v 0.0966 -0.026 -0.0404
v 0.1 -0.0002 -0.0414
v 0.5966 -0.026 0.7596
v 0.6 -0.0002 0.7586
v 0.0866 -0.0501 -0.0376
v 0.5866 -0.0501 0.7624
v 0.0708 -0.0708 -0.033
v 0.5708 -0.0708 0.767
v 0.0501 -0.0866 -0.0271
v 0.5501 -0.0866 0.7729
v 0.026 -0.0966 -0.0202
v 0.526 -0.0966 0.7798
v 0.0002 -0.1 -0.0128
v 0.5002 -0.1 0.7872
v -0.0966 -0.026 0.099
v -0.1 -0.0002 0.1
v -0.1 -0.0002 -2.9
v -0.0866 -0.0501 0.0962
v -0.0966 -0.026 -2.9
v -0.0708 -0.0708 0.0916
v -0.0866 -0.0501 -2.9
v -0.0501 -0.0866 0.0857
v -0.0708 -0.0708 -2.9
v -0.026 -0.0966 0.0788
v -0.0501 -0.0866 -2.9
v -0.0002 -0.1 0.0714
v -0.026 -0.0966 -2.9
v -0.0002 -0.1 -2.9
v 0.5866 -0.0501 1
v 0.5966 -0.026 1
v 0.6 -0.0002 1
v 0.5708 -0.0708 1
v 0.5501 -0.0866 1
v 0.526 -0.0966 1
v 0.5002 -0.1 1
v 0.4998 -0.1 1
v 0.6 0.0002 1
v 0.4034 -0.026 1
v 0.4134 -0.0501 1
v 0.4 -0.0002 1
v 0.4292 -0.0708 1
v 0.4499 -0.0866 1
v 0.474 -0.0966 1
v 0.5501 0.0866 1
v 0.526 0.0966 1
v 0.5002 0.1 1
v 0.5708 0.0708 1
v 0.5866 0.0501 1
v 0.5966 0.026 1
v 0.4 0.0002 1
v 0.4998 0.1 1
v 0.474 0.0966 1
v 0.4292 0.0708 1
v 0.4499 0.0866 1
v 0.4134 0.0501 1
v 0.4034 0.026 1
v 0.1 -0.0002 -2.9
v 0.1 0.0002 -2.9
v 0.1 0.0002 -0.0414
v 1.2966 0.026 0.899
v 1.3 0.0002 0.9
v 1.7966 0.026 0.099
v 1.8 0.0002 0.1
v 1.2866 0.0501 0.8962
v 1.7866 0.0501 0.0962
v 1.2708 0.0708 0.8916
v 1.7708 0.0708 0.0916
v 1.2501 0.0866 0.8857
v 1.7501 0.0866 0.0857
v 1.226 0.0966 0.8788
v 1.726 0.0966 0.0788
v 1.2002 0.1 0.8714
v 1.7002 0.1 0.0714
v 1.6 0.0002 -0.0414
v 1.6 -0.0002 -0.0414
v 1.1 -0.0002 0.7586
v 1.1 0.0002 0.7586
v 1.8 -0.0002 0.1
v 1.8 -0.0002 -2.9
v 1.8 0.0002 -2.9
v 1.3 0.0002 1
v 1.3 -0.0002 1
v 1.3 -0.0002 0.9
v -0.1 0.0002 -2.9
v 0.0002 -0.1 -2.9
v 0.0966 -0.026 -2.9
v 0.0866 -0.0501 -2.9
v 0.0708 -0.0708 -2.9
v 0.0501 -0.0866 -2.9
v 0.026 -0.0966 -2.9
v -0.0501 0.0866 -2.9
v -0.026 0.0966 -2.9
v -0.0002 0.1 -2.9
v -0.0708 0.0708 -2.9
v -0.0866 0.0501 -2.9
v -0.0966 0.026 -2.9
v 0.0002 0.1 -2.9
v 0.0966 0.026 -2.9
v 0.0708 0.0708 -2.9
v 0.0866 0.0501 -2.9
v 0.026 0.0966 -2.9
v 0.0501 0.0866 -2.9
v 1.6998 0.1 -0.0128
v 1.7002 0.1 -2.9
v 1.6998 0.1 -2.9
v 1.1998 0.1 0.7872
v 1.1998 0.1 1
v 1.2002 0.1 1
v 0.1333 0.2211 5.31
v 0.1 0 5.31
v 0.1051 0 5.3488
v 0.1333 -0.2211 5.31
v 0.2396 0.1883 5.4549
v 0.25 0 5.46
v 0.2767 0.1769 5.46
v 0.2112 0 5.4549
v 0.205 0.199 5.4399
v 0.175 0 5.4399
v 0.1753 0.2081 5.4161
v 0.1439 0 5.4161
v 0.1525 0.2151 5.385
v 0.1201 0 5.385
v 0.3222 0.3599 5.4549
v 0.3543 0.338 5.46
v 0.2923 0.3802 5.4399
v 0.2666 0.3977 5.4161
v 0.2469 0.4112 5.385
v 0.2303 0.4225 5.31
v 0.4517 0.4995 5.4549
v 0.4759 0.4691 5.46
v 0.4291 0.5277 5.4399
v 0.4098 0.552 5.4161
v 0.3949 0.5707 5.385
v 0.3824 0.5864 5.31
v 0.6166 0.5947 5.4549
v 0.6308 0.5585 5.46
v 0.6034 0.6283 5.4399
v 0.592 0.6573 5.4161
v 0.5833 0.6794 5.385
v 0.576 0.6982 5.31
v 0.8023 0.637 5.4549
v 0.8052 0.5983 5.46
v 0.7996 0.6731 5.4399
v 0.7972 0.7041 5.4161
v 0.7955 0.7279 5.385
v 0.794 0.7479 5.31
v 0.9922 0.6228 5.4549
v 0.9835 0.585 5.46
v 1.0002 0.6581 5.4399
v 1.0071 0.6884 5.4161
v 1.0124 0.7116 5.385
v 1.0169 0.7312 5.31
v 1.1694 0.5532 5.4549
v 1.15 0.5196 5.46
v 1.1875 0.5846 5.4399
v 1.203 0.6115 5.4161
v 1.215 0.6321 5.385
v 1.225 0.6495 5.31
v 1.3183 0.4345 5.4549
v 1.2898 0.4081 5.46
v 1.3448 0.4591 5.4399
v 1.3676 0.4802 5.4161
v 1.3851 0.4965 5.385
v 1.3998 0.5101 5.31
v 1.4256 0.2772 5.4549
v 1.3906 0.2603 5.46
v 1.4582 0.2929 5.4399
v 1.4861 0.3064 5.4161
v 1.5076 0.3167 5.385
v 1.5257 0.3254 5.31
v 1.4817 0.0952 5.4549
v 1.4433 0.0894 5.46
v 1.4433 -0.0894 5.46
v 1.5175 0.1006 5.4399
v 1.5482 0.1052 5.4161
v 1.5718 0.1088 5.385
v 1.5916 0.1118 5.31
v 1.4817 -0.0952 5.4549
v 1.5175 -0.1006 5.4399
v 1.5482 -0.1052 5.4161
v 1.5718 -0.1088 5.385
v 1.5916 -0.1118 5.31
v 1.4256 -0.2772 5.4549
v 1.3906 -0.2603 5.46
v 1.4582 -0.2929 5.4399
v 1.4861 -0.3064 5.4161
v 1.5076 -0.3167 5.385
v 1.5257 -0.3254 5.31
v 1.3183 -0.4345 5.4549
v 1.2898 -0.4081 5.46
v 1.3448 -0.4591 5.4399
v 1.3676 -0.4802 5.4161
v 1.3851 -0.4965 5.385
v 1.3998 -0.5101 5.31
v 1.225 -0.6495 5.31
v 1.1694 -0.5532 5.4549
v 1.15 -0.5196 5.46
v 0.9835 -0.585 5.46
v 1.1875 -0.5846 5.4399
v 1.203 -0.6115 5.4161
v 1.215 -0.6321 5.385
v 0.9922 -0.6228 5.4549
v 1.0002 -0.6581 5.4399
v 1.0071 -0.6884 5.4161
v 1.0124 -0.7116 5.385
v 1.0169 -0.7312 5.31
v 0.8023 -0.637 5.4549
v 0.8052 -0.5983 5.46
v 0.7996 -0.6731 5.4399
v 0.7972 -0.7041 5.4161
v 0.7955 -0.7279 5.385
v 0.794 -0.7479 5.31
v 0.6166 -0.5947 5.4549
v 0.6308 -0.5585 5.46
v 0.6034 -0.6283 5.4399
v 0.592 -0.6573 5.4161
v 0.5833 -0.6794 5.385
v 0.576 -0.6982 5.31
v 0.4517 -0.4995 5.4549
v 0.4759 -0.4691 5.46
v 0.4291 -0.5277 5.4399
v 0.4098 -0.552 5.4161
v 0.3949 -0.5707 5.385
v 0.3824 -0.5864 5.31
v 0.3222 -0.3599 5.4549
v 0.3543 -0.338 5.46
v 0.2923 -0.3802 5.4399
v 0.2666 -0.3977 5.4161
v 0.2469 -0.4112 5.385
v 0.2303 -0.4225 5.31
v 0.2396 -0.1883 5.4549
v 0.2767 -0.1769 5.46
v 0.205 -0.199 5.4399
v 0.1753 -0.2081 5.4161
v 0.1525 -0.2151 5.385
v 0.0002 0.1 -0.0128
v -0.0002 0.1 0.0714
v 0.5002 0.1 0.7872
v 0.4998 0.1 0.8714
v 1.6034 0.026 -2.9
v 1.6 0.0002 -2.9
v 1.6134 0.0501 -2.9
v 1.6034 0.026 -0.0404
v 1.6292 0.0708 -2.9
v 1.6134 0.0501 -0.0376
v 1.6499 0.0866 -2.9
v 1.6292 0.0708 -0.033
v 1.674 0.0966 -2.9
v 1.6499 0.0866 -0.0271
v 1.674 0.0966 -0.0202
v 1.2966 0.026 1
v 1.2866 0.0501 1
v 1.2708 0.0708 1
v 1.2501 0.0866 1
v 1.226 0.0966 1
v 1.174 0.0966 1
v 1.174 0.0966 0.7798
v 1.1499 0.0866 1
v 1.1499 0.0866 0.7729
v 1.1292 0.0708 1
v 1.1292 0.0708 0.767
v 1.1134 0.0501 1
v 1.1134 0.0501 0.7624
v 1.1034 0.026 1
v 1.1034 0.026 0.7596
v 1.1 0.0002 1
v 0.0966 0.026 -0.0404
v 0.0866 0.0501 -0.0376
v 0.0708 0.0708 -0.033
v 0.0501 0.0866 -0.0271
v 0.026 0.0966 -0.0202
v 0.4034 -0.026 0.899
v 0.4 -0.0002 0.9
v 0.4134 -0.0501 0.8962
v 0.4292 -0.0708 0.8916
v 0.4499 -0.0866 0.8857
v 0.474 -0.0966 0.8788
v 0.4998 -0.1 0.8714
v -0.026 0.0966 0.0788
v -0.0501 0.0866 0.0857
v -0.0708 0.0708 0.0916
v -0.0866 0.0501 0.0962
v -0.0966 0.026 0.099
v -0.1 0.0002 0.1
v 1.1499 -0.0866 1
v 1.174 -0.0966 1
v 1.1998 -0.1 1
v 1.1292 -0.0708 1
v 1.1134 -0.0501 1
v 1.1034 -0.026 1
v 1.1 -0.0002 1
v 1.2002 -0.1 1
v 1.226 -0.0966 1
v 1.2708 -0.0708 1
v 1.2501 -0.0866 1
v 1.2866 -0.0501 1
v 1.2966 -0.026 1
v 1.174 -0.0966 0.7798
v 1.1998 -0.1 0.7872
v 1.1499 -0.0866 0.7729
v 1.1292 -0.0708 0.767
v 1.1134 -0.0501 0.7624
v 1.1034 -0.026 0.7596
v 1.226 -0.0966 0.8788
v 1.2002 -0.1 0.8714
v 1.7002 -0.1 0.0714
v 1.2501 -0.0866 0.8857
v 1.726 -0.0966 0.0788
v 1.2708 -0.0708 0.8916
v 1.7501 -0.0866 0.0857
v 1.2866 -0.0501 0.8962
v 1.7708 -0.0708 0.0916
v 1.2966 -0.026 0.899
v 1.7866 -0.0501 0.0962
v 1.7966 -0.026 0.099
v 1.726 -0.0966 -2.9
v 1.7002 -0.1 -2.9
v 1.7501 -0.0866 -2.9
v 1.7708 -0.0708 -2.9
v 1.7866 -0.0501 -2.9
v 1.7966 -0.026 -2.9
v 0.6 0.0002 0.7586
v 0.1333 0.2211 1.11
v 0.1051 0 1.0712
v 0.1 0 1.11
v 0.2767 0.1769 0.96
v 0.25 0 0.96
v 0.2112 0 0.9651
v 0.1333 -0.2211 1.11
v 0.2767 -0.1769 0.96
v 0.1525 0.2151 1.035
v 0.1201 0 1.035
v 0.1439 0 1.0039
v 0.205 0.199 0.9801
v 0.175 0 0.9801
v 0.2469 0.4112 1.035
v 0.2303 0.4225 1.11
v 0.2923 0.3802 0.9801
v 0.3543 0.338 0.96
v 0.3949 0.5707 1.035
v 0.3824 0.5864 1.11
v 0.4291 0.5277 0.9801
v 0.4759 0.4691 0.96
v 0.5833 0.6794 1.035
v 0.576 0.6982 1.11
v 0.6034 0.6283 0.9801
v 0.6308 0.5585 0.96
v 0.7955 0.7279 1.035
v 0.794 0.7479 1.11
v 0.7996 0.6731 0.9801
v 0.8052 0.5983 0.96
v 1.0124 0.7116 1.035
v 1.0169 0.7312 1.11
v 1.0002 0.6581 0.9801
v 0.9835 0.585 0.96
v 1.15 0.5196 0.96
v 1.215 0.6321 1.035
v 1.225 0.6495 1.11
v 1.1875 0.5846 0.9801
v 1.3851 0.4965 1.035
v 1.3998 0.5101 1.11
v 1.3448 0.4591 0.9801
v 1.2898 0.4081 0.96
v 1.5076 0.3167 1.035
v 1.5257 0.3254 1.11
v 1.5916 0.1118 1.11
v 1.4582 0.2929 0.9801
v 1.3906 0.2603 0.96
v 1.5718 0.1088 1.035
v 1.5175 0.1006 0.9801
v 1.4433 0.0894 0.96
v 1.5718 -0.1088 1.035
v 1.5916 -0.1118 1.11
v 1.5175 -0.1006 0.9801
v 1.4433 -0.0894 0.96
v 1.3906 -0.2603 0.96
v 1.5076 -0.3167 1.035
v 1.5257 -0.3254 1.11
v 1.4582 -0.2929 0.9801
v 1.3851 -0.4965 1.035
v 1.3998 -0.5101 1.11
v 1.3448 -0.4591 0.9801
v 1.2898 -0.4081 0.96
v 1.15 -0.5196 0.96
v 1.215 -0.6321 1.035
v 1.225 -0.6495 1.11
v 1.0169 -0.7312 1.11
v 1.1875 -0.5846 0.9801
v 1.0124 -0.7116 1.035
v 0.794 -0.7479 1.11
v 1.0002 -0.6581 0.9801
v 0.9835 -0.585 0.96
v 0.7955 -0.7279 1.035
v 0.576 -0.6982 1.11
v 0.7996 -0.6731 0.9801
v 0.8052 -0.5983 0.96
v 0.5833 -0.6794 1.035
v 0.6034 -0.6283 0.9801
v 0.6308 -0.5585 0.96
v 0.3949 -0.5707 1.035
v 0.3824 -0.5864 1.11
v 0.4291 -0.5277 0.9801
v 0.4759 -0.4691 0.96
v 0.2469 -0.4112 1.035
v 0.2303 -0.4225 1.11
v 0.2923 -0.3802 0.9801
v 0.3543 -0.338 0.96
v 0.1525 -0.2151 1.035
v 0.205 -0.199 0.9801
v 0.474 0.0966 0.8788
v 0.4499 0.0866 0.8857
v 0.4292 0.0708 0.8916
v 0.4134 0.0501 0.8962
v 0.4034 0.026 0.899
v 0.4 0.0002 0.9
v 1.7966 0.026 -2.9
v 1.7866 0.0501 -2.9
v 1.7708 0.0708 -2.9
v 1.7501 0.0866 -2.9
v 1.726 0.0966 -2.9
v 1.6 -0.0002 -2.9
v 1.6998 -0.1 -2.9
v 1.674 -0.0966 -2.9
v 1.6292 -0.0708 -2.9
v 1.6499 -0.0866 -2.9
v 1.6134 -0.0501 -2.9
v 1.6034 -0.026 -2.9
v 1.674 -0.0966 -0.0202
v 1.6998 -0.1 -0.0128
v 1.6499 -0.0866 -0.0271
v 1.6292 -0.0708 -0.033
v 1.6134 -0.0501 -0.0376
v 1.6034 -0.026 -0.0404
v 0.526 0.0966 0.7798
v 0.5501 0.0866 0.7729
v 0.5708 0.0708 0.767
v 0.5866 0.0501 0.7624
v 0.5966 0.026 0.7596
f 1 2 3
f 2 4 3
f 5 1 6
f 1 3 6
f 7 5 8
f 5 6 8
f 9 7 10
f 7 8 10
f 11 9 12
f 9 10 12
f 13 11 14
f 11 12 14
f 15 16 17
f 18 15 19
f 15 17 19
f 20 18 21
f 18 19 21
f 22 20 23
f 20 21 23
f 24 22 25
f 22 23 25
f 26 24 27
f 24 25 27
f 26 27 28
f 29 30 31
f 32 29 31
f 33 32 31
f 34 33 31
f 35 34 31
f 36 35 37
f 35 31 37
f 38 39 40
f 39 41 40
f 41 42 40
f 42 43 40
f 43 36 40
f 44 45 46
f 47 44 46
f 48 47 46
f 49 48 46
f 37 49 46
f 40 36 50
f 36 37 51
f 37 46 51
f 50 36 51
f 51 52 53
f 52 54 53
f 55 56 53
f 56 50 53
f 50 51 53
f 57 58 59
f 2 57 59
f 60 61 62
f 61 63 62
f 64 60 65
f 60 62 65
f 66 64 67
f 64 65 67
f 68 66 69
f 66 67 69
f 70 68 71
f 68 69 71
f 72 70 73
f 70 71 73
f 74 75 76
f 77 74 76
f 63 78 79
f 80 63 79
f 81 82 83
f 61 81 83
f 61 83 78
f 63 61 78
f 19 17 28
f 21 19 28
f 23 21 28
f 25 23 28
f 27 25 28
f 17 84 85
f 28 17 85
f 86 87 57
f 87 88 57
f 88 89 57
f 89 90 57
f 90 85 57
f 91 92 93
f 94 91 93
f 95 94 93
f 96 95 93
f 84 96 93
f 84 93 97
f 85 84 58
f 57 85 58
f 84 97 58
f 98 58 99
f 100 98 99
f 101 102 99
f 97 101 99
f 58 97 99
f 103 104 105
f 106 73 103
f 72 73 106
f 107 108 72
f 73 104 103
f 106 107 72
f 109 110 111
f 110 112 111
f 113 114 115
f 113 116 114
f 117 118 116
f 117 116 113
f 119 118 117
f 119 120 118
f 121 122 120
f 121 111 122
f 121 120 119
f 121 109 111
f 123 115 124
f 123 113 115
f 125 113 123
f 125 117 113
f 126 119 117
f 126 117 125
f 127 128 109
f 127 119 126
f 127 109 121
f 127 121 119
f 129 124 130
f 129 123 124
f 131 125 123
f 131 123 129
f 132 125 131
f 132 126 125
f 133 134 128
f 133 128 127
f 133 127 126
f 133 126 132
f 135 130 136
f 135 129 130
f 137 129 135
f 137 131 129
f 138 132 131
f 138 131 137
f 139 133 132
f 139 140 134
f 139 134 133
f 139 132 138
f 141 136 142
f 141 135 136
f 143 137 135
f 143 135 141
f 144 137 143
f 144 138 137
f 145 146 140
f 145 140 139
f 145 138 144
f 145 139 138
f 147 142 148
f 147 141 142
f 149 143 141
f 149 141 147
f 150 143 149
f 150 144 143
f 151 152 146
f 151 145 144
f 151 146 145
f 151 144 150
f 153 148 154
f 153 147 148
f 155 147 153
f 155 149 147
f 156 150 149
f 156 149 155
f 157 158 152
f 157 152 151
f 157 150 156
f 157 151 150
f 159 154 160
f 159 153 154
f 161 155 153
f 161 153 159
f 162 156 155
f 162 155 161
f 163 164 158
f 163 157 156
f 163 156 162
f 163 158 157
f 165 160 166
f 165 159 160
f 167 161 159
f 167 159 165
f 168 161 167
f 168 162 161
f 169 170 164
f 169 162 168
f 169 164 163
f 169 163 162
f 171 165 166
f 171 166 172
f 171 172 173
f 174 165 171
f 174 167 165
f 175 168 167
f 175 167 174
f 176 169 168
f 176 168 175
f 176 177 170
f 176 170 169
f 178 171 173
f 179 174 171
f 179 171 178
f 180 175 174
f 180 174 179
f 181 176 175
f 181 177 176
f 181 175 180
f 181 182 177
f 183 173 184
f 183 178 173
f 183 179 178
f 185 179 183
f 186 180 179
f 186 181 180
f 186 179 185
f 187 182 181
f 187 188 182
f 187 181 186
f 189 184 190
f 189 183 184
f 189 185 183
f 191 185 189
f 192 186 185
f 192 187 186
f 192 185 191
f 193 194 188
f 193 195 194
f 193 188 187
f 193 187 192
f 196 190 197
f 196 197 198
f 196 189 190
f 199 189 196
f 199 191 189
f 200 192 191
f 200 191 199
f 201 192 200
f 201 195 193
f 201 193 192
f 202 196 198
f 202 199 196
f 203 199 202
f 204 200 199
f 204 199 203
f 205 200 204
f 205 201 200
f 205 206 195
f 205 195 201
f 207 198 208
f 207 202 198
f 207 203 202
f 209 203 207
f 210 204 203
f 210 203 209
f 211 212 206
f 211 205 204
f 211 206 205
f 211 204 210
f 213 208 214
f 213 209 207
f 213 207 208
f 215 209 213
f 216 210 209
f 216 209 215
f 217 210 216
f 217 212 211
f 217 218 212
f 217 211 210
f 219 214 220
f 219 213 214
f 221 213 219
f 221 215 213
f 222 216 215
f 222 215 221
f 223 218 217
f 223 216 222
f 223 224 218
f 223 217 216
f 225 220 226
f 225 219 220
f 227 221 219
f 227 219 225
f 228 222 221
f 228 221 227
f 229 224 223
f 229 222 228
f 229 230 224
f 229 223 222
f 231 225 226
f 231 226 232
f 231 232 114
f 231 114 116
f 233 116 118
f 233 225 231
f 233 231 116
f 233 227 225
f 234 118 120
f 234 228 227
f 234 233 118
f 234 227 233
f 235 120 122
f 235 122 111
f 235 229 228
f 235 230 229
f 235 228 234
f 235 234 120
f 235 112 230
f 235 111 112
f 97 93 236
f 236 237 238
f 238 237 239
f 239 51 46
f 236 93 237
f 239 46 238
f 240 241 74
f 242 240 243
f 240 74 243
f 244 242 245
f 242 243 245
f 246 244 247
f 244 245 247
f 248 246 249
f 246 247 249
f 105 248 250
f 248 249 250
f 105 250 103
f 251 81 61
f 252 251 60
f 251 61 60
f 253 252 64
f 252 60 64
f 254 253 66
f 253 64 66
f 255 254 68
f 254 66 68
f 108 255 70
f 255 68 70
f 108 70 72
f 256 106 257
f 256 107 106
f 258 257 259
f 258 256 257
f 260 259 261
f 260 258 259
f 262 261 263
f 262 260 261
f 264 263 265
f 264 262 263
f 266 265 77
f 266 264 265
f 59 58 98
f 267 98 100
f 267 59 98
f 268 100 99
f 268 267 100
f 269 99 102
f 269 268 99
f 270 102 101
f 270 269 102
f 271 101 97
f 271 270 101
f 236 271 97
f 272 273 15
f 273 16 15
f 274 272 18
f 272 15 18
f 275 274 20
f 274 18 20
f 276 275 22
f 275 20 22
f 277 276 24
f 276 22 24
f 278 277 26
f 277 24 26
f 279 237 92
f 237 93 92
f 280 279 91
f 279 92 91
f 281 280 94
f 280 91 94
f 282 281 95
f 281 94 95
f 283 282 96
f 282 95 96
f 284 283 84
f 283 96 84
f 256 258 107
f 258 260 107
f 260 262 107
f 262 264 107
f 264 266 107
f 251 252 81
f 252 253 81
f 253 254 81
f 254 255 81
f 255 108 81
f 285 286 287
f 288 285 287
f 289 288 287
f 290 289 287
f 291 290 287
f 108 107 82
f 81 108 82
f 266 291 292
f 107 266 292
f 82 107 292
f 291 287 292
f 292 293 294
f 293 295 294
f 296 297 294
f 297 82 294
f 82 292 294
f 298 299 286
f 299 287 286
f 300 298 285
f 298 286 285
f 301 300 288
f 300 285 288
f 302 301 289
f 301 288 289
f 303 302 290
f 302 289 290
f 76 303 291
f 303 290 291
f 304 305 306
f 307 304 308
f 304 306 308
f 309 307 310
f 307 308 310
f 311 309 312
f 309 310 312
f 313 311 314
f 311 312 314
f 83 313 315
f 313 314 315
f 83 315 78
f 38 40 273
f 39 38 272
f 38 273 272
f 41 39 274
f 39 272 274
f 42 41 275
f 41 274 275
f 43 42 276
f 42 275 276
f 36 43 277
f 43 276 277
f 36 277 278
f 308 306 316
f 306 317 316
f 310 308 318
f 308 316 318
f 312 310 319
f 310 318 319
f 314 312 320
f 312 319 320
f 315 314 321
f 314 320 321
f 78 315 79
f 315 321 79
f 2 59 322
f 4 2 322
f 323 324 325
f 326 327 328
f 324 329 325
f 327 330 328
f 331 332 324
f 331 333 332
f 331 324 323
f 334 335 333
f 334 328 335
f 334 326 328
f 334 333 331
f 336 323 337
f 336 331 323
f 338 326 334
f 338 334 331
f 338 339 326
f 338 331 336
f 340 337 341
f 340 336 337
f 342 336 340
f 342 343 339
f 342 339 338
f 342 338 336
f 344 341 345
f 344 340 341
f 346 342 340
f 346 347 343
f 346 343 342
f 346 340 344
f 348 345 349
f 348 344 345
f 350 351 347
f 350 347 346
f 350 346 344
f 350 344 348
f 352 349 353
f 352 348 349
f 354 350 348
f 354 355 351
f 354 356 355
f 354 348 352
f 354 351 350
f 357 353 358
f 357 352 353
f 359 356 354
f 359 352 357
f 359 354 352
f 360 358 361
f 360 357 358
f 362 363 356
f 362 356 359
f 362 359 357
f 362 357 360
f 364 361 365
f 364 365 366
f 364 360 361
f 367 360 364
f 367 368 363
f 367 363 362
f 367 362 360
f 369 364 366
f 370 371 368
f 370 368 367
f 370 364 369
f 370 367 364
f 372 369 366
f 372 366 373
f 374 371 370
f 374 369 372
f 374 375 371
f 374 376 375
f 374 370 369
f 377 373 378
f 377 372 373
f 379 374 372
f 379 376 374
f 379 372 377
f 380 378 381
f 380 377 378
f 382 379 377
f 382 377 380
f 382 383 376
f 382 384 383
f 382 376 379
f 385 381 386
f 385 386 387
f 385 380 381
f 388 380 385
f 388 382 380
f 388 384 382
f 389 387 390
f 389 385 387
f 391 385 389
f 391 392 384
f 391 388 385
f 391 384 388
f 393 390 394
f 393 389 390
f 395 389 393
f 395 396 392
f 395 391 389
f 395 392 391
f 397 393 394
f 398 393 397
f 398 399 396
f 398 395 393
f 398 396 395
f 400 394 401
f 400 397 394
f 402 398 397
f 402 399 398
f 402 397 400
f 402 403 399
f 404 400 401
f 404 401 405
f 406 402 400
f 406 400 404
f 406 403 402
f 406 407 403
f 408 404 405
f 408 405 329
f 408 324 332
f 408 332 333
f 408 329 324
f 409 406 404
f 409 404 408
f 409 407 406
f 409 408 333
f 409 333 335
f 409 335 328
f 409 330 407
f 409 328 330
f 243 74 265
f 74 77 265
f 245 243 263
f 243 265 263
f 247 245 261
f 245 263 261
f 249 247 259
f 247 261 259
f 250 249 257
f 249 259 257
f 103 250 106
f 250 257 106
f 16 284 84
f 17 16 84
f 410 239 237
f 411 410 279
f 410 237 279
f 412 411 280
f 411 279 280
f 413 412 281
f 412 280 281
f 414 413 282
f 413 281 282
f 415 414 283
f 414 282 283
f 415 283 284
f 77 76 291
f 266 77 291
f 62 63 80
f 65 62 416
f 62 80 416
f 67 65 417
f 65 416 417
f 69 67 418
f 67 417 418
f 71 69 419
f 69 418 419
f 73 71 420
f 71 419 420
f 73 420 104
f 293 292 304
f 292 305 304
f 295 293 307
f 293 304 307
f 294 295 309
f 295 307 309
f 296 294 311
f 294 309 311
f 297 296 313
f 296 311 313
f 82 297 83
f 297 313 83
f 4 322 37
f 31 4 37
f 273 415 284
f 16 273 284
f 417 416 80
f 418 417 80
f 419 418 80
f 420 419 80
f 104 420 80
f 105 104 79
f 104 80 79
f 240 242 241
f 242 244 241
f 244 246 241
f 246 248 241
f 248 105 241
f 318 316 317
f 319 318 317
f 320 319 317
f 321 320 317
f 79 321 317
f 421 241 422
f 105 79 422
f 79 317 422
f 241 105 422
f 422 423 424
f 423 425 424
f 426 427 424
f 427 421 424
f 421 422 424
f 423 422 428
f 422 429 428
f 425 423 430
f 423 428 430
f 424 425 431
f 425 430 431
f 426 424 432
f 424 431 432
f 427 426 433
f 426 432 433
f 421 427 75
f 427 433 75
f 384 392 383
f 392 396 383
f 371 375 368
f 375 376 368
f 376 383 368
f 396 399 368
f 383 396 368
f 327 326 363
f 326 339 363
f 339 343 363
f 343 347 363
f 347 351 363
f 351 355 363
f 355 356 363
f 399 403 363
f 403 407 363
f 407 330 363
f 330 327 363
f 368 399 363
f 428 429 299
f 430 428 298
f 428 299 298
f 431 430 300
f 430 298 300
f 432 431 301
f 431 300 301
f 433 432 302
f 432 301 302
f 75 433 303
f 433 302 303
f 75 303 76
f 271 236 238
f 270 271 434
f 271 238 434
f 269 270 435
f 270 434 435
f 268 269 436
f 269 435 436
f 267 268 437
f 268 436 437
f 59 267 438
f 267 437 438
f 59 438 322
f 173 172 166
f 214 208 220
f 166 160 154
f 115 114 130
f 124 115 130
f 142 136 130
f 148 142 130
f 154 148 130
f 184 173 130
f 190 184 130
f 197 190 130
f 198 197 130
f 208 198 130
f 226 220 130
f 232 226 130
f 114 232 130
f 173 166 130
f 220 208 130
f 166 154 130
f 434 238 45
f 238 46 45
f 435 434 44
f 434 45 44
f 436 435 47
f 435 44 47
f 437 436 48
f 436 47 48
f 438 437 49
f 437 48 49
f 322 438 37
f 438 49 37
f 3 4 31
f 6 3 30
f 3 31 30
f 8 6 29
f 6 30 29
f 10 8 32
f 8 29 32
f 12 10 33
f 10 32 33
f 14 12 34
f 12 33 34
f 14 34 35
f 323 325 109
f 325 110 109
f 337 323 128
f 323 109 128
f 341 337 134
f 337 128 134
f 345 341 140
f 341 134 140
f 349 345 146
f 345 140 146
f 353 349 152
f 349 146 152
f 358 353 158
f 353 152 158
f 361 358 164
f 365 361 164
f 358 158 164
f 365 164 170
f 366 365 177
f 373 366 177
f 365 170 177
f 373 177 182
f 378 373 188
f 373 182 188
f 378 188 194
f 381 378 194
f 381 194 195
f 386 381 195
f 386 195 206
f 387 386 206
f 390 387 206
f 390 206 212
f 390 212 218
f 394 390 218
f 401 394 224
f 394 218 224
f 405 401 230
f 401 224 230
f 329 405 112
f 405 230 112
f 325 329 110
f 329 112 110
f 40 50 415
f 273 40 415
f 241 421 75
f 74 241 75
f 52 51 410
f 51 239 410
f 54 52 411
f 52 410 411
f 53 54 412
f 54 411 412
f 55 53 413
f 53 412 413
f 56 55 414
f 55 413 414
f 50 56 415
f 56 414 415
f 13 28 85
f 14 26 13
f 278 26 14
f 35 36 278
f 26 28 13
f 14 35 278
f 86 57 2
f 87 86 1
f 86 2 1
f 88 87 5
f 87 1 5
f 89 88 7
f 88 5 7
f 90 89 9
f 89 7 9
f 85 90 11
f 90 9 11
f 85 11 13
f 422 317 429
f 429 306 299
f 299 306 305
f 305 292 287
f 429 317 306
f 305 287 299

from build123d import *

# Parameters (mm, degrees)
PAD_DEPTH = 0.1
FILLET_R  = 0.0998


with BuildPart() as revolution:
    # Sketch002 → Revolution (revolve)
    with BuildSketch(Plane.XZ):
        with BuildLine():
            Line((0.25, 5.46), (0.85, 5.46))
            Line((0.85, 0.96), (0.85, 5.46))
            Line((0.85, 0.96), (0.25, 0.96))
            ThreePointArc((0.1, 1.11), (0.143934, 1.003934), (0.25, 0.96))
            Line((0.1, 1.11), (0.1, 5.31))
            ThreePointArc((0.25, 5.46), (0.143934, 5.416066), (0.1, 5.31))
        make_face()
    revolve(axis=Axis((0.85, 0, 5.46), (0, 0, -1)))


with BuildPart() as fillet_body:
    # Sketch → Pad (new body, symmetric)
    with BuildSketch(Plane.XZ):
        Polygon((0.1, -2.9), (0.1, -0.041421), (0.6, 0.758579), (0.6, 1), (0.4, 1), (0.4, 0.9), (-0.1, 0.1), (-0.1, -2.9), align=None)
        Polygon((1.1, 1), (1.3, 1), (1.3, 0.9), (1.8, 0.1), (1.8, -2.9), (1.6, -2.9), (1.6, -0.041421), (1.1, 0.758579), align=None)
    extrude(amount=PAD_DEPTH, both=True)

    # Fillet
    fillet_edges = [fillet_body.edges().sort_by_distance(p)[0] for p in [
        (0.15, -0.1, 0.5),
        (0.4, -0.1, 0.95),
        (0.6, -0.1, 0.879289),
        (0.35, -0.1, 0.358579),
        (0.1, -0.1, -1.470711),
        (-0.1, -0.1, -1.4),
        (0.1, 0.1, -1.470711),
        (0.35, 0.1, 0.358579),
        (0.6, 0.1, 0.879289),
        (1.35, -0.1, 0.358579),
        (1.1, -0.1, 0.879289),
        (1.6, -0.1, -1.470711),
        (1.8, -0.1, -1.4),
        (1.55, -0.1, 0.5),
        (1.3, -0.1, 0.95),
        (1.3, 0.1, 0.95),
        (1.55, 0.1, 0.5),
        (1.8, 0.1, -1.4),
        (1.6, 0.1, -1.470711),
        (1.35, 0.1, 0.358579),
        (1.1, 0.1, 0.879289),
        (0.4, 0.1, 0.95),
        (-0.1, 0.1, -1.4),
        (0.15, 0.1, 0.5),
    ]]
    fillet(fillet_edges, radius=FILLET_R)


solid = Compound([revolution.part, fillet_body.part])
